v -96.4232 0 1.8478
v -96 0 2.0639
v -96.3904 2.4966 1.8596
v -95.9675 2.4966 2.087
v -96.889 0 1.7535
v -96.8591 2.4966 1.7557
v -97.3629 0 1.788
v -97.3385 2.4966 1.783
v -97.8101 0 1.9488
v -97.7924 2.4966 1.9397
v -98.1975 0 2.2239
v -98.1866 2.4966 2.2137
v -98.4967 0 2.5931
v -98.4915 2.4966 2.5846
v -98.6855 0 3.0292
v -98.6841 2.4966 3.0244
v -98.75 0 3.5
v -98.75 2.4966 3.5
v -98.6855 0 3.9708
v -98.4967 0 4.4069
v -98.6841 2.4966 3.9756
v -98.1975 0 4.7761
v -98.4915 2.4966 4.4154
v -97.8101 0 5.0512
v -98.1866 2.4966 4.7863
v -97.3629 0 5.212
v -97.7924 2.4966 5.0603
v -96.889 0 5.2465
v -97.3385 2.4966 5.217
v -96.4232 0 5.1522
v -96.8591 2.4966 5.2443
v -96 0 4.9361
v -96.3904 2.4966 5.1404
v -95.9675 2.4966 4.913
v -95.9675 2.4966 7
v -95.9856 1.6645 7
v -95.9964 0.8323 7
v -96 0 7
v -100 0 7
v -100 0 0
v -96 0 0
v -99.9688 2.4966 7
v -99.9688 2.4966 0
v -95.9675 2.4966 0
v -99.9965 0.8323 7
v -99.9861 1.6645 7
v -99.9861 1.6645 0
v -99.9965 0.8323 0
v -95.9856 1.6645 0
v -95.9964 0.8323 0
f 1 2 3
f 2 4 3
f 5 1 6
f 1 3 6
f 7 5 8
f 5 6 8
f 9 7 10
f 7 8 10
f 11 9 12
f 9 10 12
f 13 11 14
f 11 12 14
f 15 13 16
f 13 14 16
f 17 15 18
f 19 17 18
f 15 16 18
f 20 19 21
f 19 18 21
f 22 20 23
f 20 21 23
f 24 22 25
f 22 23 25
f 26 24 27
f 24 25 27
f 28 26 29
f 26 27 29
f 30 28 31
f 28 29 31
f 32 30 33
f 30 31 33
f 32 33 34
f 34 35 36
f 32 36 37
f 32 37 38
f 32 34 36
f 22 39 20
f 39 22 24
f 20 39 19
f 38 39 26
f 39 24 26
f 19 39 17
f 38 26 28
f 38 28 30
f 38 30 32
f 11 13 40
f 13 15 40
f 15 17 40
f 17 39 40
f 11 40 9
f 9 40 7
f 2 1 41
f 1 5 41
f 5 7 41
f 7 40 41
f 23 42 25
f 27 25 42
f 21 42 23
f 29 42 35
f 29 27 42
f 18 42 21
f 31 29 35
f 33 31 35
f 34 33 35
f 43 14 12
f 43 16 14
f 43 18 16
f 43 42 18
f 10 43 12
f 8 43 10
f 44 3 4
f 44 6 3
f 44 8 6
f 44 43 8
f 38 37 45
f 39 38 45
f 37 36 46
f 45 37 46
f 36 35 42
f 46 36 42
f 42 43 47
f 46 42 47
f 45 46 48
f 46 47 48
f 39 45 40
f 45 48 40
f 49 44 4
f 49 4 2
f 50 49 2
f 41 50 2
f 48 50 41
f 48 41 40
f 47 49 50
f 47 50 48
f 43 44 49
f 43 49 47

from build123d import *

# Parameters (mm, degrees)
PAD_DEPTH    = 7
SKETCH001_R  = 1.75
POCKET_DEPTH = 5


with BuildPart() as part:
    # Sketch → Pad (new body)
    with BuildSketch(Plane.XY):
        with BuildLine():
            ThreePointArc((-95.967531, 2.496613), (-95.991882, 1.248412), (-96, 0))
            Line((-100, 0), (-96, 0))
            ThreePointArc((-99.96883, 2.496613), (-99.992207, 1.248404), (-100, 0))
            Line((-99.96883, 2.496613), (-95.967531, 2.496613))
        make_face()
    extrude(amount=PAD_DEPTH)

    # Sketch001 (on Face1 of Pad) → Pocket (cut)
    with BuildSketch(Plane(origin=(0, 2.496613, 0), x_dir=(-1, 0, 0), z_dir=(0, 1, 0))):
        with Locations((97, 3.5)):
            Circle(SKETCH001_R)
    extrude(amount=-POCKET_DEPTH, mode=Mode.SUBTRACT)


solid = part.part
